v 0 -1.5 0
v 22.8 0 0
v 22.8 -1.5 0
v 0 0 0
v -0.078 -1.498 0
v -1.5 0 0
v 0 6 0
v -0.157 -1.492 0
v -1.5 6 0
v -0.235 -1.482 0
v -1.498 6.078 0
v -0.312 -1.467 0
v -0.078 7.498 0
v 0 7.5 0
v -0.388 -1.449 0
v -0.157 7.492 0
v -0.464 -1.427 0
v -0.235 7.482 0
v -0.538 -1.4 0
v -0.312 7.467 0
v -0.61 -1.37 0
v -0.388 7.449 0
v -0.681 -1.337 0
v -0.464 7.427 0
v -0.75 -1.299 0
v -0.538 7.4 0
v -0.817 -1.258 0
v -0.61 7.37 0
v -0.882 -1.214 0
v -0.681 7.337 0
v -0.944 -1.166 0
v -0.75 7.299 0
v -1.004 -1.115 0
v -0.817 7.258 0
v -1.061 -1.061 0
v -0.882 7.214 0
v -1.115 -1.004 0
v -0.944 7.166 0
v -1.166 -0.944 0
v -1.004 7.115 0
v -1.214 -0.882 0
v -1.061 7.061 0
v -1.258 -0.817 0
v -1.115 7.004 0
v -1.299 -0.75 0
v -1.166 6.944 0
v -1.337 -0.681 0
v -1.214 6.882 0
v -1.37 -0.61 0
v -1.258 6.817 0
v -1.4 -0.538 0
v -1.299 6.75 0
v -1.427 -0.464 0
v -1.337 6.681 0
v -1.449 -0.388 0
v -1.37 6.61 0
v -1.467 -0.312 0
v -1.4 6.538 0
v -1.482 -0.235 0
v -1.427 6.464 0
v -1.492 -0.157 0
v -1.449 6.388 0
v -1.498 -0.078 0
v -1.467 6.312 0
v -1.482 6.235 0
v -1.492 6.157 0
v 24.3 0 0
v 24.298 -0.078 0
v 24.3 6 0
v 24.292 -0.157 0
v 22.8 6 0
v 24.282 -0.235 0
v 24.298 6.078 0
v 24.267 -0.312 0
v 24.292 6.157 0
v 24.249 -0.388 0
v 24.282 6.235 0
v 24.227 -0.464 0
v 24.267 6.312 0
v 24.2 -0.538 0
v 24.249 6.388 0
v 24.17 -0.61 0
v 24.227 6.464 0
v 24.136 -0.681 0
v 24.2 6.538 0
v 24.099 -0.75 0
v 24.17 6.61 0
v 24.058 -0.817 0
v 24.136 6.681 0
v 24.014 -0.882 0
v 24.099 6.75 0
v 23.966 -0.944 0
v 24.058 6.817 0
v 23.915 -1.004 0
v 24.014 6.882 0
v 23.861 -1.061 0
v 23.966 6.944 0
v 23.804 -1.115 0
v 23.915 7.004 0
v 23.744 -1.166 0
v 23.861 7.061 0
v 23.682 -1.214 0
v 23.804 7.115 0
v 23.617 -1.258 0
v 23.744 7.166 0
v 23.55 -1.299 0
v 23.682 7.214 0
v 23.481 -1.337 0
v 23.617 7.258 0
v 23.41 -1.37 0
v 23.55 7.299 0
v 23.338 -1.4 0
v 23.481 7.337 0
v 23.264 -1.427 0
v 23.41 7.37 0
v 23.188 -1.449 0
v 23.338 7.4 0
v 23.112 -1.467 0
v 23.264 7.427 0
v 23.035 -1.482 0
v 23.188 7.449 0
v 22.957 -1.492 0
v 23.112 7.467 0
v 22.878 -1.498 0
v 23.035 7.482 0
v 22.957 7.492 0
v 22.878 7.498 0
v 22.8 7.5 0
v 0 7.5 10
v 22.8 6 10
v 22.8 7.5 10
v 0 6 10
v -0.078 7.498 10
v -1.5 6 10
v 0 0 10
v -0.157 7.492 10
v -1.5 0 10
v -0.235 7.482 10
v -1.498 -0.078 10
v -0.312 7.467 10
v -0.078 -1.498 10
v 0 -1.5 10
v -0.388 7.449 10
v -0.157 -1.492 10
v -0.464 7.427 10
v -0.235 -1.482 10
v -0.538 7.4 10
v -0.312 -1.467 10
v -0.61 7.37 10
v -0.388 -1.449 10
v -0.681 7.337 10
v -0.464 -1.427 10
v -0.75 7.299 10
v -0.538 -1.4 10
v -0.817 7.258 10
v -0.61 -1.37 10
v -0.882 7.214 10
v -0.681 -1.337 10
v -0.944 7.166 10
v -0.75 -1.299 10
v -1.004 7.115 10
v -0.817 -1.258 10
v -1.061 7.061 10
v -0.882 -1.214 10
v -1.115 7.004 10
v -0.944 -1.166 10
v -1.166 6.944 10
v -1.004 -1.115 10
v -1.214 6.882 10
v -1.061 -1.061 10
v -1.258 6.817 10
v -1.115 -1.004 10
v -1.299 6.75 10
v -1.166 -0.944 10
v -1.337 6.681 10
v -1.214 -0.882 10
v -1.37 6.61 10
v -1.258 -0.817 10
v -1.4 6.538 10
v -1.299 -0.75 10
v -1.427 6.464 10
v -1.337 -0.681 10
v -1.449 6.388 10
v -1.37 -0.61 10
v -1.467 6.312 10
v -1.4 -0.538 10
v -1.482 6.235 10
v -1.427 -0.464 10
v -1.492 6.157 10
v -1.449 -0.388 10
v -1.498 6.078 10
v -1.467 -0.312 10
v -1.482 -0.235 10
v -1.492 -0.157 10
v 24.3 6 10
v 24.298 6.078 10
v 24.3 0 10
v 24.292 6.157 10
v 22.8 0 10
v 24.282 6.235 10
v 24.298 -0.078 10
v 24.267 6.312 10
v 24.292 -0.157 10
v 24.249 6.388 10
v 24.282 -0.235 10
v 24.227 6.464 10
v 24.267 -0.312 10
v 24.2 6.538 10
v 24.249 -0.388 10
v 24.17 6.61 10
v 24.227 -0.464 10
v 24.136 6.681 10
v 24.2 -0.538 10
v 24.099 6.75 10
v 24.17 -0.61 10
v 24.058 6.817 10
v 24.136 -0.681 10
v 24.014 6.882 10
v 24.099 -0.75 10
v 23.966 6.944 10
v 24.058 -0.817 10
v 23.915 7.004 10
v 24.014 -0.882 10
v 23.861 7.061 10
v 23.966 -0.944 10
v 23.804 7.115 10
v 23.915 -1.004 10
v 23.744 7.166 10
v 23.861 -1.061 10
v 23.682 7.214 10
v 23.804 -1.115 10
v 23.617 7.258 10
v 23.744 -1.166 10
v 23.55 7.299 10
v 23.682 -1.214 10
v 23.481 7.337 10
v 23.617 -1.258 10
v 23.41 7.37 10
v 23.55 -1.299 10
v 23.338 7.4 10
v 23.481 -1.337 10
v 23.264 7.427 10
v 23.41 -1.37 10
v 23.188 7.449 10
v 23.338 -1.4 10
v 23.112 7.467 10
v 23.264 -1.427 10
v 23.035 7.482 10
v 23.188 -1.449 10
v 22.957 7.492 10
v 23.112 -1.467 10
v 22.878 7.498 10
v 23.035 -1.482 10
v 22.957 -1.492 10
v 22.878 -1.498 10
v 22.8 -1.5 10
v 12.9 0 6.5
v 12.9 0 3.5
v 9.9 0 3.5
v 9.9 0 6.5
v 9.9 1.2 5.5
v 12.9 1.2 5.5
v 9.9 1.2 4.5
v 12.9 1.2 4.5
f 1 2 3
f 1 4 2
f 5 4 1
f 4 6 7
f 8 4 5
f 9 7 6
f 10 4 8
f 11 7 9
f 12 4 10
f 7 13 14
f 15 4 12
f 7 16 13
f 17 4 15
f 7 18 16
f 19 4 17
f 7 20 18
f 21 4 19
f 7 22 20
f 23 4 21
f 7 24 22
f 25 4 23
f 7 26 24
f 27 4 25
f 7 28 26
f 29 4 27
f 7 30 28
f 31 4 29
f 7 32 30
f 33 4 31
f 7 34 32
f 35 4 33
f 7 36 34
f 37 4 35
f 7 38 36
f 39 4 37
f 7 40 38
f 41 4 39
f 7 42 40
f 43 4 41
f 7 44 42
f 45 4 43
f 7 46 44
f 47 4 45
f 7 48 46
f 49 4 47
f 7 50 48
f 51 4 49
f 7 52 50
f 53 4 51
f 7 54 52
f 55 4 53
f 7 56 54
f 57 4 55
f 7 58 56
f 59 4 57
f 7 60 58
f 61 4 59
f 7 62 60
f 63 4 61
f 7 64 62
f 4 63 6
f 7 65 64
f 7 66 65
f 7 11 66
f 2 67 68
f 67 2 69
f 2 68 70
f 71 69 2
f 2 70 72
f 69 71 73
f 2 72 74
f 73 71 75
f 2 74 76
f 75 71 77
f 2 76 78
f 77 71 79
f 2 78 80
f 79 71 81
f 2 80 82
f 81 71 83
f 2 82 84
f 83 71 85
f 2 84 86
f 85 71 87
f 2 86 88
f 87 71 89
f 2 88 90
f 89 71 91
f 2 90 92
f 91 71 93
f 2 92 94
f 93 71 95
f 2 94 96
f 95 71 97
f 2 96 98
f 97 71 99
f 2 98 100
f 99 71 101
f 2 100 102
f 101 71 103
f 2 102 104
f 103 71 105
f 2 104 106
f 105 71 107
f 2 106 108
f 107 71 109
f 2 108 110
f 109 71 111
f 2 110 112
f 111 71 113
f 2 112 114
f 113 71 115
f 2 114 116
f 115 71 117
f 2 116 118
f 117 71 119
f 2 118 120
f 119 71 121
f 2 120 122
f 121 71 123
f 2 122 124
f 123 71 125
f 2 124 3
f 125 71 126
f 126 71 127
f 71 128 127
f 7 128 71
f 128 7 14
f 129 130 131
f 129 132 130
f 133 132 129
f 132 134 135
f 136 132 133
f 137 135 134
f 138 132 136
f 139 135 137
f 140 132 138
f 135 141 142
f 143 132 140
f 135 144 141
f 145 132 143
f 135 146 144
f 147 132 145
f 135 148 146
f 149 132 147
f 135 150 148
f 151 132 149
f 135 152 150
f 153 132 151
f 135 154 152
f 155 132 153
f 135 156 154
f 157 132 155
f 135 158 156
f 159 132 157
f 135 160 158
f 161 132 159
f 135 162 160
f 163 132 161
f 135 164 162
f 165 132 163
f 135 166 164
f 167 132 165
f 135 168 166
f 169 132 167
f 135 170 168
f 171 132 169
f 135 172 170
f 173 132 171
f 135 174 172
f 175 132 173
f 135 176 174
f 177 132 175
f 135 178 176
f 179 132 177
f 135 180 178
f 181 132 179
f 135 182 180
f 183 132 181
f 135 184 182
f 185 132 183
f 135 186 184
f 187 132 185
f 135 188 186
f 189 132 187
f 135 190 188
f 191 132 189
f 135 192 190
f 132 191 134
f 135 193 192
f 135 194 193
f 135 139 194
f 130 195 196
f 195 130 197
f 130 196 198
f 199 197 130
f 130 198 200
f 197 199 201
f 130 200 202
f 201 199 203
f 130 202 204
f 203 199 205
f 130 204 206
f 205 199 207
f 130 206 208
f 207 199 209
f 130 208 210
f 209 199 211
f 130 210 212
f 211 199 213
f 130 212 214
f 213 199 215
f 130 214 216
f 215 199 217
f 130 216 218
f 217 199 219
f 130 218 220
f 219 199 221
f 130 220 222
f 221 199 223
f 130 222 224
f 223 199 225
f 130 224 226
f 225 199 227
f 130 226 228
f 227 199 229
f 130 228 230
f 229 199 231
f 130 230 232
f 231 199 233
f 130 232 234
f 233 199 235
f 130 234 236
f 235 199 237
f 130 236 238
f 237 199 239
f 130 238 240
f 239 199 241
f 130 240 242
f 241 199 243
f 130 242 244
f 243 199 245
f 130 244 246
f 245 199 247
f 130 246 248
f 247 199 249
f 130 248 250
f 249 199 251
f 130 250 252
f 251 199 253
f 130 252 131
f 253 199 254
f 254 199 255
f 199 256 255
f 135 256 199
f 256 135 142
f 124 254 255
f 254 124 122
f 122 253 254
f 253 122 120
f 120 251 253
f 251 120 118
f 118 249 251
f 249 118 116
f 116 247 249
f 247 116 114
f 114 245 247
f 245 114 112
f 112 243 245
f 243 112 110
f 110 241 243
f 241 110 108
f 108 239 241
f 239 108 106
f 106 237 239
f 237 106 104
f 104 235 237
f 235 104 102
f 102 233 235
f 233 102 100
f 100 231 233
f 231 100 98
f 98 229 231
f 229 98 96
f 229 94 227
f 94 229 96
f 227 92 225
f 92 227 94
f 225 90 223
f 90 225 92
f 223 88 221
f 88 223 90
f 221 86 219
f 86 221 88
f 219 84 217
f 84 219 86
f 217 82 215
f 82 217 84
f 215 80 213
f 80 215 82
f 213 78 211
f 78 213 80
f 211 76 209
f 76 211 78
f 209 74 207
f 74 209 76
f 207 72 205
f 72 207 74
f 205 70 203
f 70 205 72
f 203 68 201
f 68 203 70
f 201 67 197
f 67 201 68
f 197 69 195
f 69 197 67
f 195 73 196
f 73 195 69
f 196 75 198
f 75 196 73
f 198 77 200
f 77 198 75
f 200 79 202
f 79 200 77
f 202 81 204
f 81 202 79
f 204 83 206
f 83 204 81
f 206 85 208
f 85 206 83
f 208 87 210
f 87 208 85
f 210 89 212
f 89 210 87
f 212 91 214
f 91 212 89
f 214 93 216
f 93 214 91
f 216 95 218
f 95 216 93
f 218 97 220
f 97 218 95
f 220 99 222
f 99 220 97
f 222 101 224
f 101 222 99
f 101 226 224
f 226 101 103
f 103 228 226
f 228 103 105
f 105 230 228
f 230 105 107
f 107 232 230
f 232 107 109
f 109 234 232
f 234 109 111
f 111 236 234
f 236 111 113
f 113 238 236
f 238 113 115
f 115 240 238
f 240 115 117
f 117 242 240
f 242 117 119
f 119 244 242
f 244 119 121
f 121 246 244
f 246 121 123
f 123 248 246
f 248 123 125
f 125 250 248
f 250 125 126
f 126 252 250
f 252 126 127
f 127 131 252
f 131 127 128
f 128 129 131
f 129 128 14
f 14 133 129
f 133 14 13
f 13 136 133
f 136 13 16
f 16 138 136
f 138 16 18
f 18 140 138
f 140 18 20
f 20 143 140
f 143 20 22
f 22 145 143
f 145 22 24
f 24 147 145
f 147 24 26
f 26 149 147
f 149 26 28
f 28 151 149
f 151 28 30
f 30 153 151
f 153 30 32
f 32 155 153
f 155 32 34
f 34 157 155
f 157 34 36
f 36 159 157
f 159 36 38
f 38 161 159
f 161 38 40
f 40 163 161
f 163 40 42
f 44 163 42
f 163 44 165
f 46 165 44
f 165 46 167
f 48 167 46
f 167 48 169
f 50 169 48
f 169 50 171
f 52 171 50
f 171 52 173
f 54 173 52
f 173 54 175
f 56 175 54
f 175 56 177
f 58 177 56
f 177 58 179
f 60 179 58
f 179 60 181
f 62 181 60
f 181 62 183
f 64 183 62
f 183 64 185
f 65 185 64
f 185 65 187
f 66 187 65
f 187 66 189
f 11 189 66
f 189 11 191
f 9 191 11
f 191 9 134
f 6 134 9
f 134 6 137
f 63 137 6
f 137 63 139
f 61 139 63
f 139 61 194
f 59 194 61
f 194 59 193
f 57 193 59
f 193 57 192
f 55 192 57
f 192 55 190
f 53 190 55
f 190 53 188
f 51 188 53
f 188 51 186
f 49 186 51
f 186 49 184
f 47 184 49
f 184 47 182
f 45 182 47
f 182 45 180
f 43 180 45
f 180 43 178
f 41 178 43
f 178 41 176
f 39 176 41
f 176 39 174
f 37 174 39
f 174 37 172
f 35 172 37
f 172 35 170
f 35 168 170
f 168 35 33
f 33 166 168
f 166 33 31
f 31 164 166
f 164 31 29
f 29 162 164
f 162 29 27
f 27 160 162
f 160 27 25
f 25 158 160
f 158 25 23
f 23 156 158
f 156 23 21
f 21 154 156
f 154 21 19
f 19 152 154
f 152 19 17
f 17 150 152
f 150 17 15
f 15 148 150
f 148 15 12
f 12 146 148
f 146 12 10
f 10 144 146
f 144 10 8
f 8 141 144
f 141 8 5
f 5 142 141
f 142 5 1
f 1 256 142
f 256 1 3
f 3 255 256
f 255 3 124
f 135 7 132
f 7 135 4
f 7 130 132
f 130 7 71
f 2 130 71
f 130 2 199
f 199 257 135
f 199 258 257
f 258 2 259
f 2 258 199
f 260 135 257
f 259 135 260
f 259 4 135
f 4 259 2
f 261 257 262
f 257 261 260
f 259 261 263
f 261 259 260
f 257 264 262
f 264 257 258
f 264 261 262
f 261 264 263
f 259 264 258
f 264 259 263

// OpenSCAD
A=22.8;// 
B=6;
H=10;

module stopper(){
   //3x3 
    rotate([0,90,0])
    linear_extrude(height=3, center=true)
    polygon([[0,0], [3,0], [2,1.2], [1,1.2]]);
}

// main body
linear_extrude(height=H)
difference(){
    minkowski(){
        square([A,B]);
        circle(r=1.5, $fn=120); // can adjut r 1..1.5
    }//stopper();
    square([A,B]);
}

// small piece to prevent it from sliding
translate([A/2,0,H/2+1.5])
 stopper();
